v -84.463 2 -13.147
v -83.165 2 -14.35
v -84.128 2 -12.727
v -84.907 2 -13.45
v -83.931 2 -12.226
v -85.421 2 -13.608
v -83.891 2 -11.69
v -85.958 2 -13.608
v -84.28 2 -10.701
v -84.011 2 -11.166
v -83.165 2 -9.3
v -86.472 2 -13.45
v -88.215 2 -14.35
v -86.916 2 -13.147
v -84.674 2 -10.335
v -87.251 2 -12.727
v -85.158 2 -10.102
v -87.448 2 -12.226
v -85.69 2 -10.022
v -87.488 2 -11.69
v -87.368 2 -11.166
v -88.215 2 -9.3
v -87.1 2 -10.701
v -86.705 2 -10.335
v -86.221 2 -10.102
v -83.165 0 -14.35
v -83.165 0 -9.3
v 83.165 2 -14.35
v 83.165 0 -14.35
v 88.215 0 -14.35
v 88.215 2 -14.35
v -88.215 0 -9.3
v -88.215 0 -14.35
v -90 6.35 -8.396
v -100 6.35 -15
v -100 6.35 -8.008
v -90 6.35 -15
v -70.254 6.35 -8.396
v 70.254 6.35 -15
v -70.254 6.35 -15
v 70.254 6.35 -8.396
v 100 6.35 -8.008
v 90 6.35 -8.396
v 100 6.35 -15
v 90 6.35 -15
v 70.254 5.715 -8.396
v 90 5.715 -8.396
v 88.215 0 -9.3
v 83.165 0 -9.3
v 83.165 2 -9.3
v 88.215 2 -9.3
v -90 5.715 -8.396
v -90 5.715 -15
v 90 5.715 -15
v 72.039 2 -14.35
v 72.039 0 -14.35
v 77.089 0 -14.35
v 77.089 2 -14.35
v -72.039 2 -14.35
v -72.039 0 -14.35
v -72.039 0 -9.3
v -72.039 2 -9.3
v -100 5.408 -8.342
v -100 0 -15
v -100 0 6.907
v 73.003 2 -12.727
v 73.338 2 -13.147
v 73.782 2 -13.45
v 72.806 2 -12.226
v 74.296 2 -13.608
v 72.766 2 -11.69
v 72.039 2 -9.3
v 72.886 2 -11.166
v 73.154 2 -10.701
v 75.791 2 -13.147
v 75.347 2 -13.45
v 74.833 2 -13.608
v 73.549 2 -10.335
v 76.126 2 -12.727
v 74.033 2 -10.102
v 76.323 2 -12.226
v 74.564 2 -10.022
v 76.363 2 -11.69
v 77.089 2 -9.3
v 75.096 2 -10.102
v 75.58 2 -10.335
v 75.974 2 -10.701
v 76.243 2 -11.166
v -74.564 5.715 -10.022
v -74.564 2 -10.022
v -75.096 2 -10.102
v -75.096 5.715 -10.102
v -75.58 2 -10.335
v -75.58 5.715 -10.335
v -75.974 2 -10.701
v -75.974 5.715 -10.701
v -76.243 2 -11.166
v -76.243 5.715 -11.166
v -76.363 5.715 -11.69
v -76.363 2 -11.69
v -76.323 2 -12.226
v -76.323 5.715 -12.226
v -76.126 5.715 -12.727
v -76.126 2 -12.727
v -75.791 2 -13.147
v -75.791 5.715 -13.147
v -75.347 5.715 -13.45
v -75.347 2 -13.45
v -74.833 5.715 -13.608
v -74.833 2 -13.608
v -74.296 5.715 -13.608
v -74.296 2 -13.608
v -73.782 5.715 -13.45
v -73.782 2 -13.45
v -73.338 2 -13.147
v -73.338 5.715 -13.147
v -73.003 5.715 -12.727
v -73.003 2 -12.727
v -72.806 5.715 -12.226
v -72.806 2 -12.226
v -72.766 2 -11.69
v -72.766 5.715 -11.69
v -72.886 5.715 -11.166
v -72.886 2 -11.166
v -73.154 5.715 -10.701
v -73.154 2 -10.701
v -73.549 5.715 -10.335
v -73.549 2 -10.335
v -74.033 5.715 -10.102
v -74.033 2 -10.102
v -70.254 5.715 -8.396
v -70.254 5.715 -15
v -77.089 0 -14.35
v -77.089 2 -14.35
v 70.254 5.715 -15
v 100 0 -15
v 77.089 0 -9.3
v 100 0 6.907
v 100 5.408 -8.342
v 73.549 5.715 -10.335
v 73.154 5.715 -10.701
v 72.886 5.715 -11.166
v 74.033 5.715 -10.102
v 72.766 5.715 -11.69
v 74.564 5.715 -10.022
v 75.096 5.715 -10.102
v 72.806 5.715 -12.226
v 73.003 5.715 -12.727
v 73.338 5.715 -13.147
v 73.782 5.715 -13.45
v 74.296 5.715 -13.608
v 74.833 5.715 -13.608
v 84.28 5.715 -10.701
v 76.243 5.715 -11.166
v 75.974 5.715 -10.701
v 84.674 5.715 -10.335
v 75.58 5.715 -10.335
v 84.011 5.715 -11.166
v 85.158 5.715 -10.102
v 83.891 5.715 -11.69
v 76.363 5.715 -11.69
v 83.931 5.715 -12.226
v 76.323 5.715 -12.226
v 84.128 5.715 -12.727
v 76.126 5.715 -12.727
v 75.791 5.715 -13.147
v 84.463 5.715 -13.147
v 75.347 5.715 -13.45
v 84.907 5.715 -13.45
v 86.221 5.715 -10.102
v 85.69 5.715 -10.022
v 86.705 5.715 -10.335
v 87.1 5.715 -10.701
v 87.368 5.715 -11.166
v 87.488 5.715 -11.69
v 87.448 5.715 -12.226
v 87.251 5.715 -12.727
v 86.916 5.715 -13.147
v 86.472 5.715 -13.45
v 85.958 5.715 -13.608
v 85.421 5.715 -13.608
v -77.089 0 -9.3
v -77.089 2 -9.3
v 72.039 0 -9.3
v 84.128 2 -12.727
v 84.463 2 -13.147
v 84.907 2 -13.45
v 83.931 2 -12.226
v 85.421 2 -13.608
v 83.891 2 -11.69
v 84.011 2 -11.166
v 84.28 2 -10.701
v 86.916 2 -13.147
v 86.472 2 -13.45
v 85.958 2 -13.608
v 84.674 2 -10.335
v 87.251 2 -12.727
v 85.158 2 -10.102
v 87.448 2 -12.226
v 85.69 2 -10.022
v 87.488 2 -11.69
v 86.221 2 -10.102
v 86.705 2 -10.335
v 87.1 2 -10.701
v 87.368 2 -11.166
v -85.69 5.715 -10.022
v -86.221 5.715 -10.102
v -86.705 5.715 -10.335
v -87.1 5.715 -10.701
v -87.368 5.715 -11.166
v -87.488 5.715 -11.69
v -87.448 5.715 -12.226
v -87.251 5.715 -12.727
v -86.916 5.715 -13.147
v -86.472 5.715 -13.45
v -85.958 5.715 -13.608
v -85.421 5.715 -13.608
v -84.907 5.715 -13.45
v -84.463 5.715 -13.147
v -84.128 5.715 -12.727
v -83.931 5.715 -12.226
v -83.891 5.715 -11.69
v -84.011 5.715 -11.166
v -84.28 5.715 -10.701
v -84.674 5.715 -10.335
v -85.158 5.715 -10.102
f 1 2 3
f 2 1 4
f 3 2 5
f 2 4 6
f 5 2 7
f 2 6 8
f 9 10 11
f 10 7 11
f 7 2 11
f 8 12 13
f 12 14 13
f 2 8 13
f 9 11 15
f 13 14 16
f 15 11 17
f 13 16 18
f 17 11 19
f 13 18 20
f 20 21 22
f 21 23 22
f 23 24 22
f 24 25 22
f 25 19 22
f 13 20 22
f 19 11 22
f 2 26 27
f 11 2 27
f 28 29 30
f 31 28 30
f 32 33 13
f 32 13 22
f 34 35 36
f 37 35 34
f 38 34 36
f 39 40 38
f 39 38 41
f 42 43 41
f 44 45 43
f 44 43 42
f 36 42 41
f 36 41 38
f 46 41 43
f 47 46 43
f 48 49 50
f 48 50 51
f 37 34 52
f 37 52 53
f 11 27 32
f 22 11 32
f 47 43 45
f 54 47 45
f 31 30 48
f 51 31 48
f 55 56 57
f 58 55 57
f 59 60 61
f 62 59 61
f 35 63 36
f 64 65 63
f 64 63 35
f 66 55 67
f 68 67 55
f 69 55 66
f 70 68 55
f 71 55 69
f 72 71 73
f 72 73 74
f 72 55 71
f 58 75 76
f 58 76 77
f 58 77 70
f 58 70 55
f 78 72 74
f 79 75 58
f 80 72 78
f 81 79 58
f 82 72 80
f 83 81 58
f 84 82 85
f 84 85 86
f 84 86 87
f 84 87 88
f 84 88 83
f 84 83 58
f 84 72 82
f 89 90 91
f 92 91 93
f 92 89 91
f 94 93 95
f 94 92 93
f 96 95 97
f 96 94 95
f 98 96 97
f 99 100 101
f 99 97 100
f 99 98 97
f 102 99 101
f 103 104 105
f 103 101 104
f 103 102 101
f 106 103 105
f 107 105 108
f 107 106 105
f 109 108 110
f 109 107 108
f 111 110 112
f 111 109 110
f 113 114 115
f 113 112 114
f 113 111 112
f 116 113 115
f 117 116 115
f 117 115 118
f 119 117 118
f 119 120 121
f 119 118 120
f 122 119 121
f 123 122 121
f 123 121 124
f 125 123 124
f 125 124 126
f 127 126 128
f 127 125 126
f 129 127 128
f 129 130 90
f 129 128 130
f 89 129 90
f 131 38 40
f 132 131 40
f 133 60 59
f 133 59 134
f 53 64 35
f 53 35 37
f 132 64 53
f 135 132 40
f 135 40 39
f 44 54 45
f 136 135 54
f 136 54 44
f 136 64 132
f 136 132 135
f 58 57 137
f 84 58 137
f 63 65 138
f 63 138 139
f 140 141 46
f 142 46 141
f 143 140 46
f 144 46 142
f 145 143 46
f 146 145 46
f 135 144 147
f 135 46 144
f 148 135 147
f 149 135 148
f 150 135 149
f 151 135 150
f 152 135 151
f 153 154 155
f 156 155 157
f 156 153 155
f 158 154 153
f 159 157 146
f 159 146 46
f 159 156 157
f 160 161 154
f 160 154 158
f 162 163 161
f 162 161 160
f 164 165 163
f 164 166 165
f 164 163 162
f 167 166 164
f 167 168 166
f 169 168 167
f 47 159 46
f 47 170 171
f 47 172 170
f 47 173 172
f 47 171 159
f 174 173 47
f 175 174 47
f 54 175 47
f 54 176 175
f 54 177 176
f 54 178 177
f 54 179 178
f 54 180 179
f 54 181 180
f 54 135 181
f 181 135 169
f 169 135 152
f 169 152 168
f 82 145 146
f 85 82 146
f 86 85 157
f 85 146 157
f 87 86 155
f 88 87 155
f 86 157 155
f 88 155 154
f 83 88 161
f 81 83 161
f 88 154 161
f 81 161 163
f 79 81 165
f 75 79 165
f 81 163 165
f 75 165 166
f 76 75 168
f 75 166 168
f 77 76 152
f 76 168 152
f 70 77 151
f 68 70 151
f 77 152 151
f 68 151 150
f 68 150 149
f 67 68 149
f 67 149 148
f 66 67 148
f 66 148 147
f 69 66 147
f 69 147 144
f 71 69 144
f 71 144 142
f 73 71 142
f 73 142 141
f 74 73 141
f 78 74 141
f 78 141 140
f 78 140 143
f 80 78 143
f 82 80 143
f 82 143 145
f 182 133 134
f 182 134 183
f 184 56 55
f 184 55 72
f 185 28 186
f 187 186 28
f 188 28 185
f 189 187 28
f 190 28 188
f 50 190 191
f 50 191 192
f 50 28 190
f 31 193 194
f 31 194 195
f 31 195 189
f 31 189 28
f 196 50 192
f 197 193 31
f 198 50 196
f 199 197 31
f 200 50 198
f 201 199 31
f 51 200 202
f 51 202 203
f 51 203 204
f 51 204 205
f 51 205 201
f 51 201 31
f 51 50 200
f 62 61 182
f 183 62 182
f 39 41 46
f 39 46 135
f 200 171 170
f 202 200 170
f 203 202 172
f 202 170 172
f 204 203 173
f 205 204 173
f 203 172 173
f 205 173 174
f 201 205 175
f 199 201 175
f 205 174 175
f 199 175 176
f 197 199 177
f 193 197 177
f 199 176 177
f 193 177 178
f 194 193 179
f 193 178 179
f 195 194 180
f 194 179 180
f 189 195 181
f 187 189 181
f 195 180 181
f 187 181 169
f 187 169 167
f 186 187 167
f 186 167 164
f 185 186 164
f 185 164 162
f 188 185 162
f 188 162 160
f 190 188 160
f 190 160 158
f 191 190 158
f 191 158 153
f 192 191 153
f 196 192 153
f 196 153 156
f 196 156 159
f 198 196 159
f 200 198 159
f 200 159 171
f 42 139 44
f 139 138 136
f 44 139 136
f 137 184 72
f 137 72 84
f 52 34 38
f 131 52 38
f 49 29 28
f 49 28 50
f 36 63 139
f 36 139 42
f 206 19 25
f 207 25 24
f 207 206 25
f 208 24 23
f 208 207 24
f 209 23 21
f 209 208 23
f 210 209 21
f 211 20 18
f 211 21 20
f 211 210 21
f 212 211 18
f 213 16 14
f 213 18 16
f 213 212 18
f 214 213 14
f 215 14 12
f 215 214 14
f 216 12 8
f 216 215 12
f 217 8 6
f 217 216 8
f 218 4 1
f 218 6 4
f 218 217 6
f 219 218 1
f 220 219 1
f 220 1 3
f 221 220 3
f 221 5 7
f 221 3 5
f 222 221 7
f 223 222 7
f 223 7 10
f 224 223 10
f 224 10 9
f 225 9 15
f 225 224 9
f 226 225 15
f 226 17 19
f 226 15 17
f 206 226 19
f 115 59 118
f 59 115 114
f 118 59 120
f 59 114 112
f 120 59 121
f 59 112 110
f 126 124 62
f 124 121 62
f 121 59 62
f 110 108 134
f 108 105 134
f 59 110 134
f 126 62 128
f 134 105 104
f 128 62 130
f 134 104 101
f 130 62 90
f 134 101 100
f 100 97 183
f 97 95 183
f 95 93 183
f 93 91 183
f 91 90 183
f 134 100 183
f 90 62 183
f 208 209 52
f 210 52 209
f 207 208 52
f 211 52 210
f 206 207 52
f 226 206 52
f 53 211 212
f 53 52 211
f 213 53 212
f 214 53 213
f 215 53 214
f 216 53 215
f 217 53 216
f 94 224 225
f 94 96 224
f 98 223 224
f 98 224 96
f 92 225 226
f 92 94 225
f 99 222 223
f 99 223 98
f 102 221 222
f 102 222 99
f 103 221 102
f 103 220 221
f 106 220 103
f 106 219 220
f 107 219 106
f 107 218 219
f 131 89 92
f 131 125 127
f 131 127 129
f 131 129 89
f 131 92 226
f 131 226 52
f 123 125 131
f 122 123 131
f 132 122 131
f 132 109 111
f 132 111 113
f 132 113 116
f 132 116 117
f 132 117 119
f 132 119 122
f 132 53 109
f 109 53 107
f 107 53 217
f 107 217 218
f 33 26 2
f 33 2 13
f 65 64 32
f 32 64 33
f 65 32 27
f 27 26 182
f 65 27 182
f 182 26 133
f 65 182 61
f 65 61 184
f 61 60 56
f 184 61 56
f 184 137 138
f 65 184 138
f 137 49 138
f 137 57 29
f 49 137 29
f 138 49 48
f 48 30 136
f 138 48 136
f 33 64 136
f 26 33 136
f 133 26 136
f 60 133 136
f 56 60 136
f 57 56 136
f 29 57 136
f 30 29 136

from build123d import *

# Parameters (mm, degrees)
SKETCH1_W            = 200
SKETCH1_H            = 30
BASE_DEPTH           = 6.35
WEDGECUT_REACH       = 202.662
SKETCH3_W            = 19.745999878
SKETCH3_H            = 6.604
HINGE_CUTOUT_DEPTH   = 0.635
HINGE_HOLE_CUT_REACH = 103.28
SKETCH4_R            = 1.8034
SKETCH5_W            = 5.05
SKETCH5_H            = 5.05
HINGE_NUT_CUT_DEPTH  = 2


with BuildPart() as part:
    # Sketch1 → Base (new body)
    with BuildSketch(Plane(origin=(0, 0, 0), x_dir=(1, 0, 0), z_dir=(0, 1, 0))):
        Rectangle(SKETCH1_W, SKETCH1_H)
    extrude(amount=BASE_DEPTH)

    # Sketch2 → WedgeCut (cut, up to next)
    with BuildSketch(Plane(origin=(100, 0, 0), x_dir=(0, 0, -1), z_dir=(1, 0, 0)), mode=Mode.PRIVATE) as wedgecut_sk1:
        Polygon((-15, 0), (-6.907470508, 0), (8.342084542, 5.407501552), (8.007874016, 6.35), (-15, 6.35), align=None)
    wedgecut_tool1 = extrude(wedgecut_sk1.sketch, amount=-WEDGECUT_REACH, mode=Mode.PRIVATE) & part.part
    add(wedgecut_tool1.solids().sort_by_distance((100, 3.70048, 5.888491))[0], mode=Mode.SUBTRACT)

    # Sketch3 → Hinge Cutout (cut)
    with BuildSketch(Plane(origin=(0, 6.35, 0), x_dir=(1, 0, 0), z_dir=(0, 1, 0))):
        with Locations((-80.127000061, 11.698)):
            Rectangle(SKETCH3_W, SKETCH3_H)
        with Locations((80.127000061, 11.698)):
            Rectangle(SKETCH3_W, SKETCH3_H)
    extrude(amount=-HINGE_CUTOUT_DEPTH, mode=Mode.SUBTRACT)

    # Sketch4 → Hinge Hole Cut (cut, up to next)
    with BuildSketch(Plane(origin=(0, 5.715, 0), x_dir=(1, 0, 0), z_dir=(0, 1, 0)), mode=Mode.PRIVATE) as hinge_hole_cut_sk1:
        with Locations(Location((74.564400061, 11.825, 0), (0, 0, 270))):
            Circle(SKETCH4_R)
    hinge_hole_cut_tool1 = extrude(hinge_hole_cut_sk1.sketch, amount=-HINGE_HOLE_CUT_REACH, mode=Mode.PRIVATE) & part.part
    # Sketch4 → Hinge Hole Cut (cut, up to next)
    with BuildSketch(Plane(origin=(0, 5.715, 0), x_dir=(1, 0, 0), z_dir=(0, 1, 0)), mode=Mode.PRIVATE) as hinge_hole_cut_sk2:
        with Locations(Location((85.689600061, 11.825, 0), (0, 0, 270))):
            Circle(SKETCH4_R)
    hinge_hole_cut_tool2 = extrude(hinge_hole_cut_sk2.sketch, amount=-HINGE_HOLE_CUT_REACH, mode=Mode.PRIVATE) & part.part
    hinge_hole_cut_1 = hinge_hole_cut_tool1.solids().sort_by_distance((74.5644, 5.715, -11.825))[0]
    add(hinge_hole_cut_1, mode=Mode.SUBTRACT)
    hinge_hole_cut_2 = hinge_hole_cut_tool2.solids().sort_by_distance((85.6896, 5.715, -11.825))[0]
    add(hinge_hole_cut_2, mode=Mode.SUBTRACT)
    hinge_hole_cut = hinge_hole_cut_1 + hinge_hole_cut_2  # Hinge Hole Cut as one shape, for the pattern or mirror that repeats it

    # Sketch5 → Hinge Nut Cut (cut)
    with BuildSketch(Plane.XZ):
        with Locations((74.564400061, -11.825)):
            Rectangle(SKETCH5_W, SKETCH5_H)
        with Locations((85.689600061, -11.825)):
            Rectangle(SKETCH5_W, SKETCH5_H)
    hinge_nut_cut = extrude(amount=-HINGE_NUT_CUT_DEPTH, mode=Mode.SUBTRACT)

    # Hinge Hole Mirror: Hinge Hole Cut, Hinge Nut Cut across plane
    add(hinge_hole_cut.mirror(Plane(origin=(0, 0, 0), x_dir=(0, 0, 1), z_dir=(1, 0, 0))), mode=Mode.SUBTRACT)
    add(hinge_nut_cut.mirror(Plane(origin=(0, 0, 0), x_dir=(0, 0, 1), z_dir=(1, 0, 0))), mode=Mode.SUBTRACT)


solid = part.part
